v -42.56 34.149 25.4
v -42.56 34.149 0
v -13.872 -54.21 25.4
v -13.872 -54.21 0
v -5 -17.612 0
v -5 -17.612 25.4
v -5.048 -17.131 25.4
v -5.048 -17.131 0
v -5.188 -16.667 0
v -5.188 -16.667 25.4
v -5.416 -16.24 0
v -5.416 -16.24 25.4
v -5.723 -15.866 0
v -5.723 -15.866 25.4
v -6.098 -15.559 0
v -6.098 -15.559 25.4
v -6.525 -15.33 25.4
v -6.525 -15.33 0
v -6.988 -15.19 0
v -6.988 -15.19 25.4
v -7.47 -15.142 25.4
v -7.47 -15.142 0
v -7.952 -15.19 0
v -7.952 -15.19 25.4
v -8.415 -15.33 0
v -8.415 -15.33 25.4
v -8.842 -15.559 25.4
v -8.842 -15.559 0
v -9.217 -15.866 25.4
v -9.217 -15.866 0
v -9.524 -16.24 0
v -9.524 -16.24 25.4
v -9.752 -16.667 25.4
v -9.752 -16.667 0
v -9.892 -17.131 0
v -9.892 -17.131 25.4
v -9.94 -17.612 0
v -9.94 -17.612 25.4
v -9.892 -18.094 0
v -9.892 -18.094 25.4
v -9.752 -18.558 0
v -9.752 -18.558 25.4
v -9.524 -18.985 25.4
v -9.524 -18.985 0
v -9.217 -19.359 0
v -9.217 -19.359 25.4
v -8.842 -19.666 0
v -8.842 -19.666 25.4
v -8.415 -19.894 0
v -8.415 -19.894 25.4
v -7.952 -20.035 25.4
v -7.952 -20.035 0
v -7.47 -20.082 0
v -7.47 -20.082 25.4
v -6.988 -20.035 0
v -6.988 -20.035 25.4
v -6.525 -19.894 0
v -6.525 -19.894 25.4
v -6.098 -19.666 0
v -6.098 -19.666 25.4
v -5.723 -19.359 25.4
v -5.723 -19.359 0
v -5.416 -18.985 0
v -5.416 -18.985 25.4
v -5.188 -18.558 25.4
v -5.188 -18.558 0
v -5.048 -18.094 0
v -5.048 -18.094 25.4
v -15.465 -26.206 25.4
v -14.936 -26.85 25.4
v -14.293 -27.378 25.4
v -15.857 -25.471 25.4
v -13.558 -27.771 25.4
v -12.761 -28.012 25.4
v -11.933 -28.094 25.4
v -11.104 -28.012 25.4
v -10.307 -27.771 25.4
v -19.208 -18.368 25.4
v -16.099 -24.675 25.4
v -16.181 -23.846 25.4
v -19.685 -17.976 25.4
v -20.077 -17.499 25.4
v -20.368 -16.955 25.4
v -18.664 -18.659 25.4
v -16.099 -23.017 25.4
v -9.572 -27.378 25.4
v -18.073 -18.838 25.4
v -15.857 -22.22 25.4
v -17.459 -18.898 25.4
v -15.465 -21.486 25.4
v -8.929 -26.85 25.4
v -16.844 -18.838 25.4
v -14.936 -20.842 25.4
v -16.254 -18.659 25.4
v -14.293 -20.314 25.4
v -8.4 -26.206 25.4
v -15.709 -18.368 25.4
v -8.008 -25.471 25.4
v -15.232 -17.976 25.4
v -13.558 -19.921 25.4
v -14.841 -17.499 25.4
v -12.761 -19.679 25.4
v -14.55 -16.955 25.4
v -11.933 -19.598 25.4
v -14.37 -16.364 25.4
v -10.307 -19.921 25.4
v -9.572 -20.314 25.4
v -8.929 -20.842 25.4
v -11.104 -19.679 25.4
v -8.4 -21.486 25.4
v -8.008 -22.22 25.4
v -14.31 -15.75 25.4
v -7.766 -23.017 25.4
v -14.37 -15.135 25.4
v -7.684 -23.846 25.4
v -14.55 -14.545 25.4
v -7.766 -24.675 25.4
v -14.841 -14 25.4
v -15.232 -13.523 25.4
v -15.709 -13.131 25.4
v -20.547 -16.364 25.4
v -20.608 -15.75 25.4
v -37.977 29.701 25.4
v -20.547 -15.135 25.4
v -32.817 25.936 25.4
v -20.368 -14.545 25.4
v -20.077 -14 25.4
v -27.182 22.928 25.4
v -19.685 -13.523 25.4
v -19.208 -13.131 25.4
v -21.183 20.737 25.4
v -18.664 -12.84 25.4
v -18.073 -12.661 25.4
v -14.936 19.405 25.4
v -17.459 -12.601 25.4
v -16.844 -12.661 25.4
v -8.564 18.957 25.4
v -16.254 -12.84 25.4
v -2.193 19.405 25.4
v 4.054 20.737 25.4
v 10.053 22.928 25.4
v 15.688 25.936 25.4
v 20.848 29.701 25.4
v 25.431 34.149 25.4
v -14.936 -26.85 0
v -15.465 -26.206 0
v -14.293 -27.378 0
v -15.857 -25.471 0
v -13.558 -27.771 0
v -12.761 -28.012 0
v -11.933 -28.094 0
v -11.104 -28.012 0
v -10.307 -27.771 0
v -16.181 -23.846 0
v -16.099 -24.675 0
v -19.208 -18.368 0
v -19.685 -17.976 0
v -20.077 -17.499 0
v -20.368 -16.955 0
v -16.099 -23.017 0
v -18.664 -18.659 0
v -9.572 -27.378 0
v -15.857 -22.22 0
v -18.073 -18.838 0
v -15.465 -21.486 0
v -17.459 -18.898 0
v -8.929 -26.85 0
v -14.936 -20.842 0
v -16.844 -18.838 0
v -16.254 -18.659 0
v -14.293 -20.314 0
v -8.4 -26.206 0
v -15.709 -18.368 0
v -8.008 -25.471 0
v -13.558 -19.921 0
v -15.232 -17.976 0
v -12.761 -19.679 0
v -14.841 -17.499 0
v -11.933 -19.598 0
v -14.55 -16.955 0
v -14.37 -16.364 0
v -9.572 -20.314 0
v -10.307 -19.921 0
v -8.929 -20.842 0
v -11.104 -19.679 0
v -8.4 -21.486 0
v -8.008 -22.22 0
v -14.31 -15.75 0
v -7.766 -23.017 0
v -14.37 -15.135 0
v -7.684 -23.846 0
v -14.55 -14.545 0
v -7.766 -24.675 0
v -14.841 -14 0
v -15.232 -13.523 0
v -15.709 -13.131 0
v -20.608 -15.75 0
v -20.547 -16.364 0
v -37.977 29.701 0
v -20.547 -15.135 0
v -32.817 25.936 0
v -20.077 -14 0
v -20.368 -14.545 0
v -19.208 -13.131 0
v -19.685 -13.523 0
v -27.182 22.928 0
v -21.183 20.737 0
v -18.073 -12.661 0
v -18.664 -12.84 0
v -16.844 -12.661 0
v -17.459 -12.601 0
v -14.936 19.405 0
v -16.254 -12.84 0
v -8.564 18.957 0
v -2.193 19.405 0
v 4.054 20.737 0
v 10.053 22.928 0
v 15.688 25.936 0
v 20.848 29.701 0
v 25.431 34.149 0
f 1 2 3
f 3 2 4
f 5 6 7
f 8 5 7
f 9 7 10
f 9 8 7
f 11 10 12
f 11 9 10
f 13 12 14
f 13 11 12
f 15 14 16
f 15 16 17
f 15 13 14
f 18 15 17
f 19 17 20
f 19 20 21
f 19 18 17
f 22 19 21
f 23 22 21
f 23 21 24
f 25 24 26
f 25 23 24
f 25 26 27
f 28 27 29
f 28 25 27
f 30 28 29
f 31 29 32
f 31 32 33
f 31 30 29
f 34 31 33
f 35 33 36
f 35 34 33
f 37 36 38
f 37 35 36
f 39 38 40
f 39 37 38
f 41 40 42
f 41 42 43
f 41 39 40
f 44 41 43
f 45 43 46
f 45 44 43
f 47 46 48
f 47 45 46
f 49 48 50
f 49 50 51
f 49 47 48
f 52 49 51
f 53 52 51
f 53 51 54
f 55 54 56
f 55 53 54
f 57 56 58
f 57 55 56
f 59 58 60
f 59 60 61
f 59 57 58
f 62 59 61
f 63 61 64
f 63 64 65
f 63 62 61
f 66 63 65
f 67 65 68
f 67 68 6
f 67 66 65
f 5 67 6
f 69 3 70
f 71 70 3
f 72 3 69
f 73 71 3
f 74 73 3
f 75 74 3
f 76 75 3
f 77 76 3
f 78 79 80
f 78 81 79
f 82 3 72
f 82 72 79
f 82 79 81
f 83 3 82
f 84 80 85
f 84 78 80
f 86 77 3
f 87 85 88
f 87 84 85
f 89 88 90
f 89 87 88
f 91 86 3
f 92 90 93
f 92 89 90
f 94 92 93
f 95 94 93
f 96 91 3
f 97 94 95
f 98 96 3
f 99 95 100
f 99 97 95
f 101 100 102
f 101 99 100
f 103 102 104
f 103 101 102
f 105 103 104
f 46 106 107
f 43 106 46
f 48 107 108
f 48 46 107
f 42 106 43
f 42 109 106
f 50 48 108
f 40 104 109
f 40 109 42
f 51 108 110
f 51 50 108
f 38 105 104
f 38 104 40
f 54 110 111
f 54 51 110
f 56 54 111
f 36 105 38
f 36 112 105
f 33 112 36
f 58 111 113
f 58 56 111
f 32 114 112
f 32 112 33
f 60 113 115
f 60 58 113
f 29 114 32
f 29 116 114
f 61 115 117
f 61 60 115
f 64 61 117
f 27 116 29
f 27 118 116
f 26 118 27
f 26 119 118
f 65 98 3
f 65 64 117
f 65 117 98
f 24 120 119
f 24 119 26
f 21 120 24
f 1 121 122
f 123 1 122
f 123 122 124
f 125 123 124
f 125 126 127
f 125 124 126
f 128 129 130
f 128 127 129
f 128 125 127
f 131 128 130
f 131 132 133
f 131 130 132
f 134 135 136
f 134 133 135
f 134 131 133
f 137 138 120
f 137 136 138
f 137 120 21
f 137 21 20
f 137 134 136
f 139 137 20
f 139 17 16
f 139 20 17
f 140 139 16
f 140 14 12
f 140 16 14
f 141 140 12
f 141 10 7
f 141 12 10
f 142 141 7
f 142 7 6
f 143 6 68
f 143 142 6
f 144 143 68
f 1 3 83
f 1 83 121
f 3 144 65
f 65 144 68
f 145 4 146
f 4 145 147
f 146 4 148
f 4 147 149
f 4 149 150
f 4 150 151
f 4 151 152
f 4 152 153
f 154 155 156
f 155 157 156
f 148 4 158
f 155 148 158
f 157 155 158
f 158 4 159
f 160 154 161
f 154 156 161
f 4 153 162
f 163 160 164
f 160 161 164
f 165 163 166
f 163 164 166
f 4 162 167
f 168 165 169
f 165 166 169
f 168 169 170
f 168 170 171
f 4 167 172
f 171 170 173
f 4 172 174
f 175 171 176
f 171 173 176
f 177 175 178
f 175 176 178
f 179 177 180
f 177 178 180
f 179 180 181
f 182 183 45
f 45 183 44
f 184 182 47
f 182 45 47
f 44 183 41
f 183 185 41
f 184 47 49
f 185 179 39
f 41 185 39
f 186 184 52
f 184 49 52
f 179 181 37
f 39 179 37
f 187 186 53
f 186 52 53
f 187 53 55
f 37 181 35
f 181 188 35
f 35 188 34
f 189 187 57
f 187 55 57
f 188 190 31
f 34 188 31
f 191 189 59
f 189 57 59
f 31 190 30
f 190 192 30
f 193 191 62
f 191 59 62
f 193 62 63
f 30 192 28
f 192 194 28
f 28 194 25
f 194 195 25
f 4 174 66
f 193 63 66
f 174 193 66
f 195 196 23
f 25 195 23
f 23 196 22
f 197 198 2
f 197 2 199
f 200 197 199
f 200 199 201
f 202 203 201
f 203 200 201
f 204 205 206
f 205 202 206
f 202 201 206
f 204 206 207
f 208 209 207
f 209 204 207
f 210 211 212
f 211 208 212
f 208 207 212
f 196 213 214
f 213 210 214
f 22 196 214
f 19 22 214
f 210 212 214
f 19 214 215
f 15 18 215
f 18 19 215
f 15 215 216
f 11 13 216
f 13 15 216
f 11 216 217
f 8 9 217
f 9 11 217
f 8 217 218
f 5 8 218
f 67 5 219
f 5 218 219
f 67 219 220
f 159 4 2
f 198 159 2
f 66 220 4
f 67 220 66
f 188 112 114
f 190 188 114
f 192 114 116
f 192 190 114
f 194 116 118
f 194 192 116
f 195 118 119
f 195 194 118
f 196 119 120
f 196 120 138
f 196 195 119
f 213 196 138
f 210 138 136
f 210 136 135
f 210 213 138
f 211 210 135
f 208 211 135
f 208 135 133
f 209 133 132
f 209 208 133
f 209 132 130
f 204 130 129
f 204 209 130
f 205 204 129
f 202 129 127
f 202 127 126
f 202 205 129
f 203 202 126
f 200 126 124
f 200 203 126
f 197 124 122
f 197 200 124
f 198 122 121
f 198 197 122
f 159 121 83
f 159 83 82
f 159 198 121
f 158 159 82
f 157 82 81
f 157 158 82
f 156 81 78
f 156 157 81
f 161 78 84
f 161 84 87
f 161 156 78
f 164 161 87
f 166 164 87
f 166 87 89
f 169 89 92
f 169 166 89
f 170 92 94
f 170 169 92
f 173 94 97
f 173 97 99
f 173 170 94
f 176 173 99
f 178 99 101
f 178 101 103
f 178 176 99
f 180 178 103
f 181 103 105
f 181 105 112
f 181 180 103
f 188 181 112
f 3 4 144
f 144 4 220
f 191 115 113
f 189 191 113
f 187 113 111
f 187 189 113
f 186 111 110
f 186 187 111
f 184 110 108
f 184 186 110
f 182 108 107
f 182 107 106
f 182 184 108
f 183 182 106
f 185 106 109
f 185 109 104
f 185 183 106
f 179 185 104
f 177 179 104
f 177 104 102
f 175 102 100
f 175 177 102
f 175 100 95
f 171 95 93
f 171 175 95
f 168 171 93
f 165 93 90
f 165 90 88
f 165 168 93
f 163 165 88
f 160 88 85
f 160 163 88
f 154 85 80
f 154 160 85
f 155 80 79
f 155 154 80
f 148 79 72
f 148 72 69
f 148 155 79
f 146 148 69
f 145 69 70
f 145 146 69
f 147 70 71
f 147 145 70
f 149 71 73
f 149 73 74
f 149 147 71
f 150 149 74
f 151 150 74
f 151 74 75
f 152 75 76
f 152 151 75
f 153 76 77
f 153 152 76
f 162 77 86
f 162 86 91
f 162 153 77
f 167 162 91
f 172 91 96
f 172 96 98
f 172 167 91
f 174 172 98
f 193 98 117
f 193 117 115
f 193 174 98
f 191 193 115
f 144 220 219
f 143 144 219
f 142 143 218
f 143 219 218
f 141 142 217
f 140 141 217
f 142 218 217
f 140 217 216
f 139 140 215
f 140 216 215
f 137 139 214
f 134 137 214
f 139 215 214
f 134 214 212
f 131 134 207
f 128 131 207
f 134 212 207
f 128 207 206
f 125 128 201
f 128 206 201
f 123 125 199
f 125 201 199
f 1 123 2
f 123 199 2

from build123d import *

# Parameters (mm, degrees)
F0_R     = 4.248171
F0_R_2   = 3.148888
F0_R_3   = 2.469941
F1_DEPTH = 25.4


with BuildPart() as f1:
    # F0 (on Top) → F1 (new body)
    with BuildSketch(Plane.XY):
        with BuildLine():
            ThreePointArc((25.431026, 34.149278), (-8.564489, 18.957498), (-42.560004, 34.149278))
            Line((-42.560004, 34.149278), (-13.871806, -54.210376))
            Line((-13.871806, -54.210376), (25.431026, 34.149278))
        make_face()
        with Locations((-11.932543, -23.845781)):
            Circle(F0_R, mode=Mode.SUBTRACT)
        with Locations((-17.458783, -15.749557)):
            Circle(F0_R_2, mode=Mode.SUBTRACT)
        with Locations((-7.469992, -17.612405)):
            Circle(F0_R_3, mode=Mode.SUBTRACT)
    extrude(amount=F1_DEPTH)


solid = f1.part
